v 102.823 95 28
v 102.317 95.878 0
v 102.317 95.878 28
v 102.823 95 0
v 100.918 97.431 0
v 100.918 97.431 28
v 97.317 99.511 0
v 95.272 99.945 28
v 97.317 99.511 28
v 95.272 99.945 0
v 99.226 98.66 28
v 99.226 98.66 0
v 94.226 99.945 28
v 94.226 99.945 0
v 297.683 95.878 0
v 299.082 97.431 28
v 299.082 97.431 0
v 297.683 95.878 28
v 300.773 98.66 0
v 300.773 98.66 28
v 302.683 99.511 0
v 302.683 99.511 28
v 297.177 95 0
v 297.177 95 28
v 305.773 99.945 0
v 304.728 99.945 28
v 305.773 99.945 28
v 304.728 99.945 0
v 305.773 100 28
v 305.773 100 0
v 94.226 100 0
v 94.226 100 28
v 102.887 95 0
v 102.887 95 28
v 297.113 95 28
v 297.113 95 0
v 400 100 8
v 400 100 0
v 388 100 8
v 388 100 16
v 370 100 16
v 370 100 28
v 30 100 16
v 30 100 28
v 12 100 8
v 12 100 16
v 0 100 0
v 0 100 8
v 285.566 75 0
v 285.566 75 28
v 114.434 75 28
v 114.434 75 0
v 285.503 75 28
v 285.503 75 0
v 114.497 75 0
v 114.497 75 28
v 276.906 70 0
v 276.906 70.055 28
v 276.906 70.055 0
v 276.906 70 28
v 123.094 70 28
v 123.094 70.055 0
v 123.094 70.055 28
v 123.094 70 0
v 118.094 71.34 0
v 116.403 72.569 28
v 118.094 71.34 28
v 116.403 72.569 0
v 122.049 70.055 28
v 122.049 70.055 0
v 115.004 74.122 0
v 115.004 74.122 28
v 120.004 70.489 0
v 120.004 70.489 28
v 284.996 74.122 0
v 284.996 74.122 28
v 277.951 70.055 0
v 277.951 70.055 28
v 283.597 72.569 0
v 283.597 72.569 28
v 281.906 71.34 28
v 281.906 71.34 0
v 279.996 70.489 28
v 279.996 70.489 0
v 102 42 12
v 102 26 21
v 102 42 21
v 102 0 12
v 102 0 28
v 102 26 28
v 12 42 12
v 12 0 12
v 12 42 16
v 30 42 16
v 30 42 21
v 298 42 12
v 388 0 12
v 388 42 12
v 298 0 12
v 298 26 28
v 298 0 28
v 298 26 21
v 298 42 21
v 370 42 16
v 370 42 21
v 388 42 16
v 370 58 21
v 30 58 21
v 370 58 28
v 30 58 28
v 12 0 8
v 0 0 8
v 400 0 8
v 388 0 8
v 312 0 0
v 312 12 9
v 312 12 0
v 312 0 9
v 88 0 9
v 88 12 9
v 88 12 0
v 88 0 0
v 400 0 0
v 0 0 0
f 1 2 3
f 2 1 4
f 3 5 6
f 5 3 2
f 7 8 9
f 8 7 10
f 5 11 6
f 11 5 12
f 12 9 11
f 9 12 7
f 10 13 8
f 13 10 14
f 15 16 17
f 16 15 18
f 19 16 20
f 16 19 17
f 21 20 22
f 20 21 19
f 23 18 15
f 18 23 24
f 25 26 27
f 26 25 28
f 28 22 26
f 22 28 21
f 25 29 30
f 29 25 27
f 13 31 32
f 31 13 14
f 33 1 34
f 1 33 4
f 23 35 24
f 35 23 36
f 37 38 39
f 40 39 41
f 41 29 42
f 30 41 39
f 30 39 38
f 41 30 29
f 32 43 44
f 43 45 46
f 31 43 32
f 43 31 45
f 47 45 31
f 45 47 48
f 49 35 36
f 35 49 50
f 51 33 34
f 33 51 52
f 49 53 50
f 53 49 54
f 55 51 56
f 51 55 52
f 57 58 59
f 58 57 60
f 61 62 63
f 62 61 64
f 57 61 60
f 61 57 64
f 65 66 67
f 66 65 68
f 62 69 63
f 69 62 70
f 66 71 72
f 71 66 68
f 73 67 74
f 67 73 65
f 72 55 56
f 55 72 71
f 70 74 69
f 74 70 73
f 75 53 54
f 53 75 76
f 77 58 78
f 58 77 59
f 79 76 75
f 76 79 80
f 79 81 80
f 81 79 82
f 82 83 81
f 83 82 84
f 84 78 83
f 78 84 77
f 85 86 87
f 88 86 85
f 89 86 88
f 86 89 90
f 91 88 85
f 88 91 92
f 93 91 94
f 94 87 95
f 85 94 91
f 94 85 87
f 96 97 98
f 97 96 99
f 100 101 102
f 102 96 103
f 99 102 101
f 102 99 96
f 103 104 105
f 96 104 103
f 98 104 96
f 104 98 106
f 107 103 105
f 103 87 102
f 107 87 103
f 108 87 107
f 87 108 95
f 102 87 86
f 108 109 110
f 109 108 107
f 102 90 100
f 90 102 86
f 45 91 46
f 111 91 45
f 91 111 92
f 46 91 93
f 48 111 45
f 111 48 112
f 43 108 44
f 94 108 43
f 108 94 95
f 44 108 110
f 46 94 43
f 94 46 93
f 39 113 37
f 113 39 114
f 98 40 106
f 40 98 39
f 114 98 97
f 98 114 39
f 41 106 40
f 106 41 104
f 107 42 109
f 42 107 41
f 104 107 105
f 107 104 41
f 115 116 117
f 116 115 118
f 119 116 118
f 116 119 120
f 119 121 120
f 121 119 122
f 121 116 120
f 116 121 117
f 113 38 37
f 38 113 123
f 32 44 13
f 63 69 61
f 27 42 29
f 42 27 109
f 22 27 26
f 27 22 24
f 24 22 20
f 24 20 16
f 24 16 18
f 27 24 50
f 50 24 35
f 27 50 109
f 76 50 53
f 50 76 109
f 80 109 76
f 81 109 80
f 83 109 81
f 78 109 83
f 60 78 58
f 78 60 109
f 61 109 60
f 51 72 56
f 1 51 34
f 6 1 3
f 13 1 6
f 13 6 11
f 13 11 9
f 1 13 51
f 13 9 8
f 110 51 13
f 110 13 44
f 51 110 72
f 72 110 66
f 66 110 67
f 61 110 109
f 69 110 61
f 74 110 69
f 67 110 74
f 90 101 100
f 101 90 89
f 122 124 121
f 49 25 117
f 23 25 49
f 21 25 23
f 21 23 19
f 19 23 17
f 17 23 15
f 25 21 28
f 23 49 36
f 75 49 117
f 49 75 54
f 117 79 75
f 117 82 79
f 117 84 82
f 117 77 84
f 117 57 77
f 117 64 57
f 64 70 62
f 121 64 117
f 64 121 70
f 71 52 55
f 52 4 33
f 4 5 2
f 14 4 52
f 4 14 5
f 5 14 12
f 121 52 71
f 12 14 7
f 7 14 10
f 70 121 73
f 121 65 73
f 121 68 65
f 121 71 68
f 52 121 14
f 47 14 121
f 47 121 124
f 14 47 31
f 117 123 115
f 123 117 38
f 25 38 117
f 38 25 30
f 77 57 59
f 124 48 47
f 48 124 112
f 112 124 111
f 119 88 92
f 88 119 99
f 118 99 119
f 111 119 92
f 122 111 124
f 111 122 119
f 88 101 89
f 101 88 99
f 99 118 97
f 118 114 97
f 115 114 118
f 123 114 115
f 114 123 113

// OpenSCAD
include <../src/wardrobe.scad>;
plank_xz_rear_bottom(wardrobe_n);
//github_openscad -o wardrobe_3/plank_xz_rear_bottom.stl -D wardrobe_n=3 -D cutting_edge=0 -D break_view_length=0 wardrobe_3/plank_xz_rear_bottom_stl.scad
